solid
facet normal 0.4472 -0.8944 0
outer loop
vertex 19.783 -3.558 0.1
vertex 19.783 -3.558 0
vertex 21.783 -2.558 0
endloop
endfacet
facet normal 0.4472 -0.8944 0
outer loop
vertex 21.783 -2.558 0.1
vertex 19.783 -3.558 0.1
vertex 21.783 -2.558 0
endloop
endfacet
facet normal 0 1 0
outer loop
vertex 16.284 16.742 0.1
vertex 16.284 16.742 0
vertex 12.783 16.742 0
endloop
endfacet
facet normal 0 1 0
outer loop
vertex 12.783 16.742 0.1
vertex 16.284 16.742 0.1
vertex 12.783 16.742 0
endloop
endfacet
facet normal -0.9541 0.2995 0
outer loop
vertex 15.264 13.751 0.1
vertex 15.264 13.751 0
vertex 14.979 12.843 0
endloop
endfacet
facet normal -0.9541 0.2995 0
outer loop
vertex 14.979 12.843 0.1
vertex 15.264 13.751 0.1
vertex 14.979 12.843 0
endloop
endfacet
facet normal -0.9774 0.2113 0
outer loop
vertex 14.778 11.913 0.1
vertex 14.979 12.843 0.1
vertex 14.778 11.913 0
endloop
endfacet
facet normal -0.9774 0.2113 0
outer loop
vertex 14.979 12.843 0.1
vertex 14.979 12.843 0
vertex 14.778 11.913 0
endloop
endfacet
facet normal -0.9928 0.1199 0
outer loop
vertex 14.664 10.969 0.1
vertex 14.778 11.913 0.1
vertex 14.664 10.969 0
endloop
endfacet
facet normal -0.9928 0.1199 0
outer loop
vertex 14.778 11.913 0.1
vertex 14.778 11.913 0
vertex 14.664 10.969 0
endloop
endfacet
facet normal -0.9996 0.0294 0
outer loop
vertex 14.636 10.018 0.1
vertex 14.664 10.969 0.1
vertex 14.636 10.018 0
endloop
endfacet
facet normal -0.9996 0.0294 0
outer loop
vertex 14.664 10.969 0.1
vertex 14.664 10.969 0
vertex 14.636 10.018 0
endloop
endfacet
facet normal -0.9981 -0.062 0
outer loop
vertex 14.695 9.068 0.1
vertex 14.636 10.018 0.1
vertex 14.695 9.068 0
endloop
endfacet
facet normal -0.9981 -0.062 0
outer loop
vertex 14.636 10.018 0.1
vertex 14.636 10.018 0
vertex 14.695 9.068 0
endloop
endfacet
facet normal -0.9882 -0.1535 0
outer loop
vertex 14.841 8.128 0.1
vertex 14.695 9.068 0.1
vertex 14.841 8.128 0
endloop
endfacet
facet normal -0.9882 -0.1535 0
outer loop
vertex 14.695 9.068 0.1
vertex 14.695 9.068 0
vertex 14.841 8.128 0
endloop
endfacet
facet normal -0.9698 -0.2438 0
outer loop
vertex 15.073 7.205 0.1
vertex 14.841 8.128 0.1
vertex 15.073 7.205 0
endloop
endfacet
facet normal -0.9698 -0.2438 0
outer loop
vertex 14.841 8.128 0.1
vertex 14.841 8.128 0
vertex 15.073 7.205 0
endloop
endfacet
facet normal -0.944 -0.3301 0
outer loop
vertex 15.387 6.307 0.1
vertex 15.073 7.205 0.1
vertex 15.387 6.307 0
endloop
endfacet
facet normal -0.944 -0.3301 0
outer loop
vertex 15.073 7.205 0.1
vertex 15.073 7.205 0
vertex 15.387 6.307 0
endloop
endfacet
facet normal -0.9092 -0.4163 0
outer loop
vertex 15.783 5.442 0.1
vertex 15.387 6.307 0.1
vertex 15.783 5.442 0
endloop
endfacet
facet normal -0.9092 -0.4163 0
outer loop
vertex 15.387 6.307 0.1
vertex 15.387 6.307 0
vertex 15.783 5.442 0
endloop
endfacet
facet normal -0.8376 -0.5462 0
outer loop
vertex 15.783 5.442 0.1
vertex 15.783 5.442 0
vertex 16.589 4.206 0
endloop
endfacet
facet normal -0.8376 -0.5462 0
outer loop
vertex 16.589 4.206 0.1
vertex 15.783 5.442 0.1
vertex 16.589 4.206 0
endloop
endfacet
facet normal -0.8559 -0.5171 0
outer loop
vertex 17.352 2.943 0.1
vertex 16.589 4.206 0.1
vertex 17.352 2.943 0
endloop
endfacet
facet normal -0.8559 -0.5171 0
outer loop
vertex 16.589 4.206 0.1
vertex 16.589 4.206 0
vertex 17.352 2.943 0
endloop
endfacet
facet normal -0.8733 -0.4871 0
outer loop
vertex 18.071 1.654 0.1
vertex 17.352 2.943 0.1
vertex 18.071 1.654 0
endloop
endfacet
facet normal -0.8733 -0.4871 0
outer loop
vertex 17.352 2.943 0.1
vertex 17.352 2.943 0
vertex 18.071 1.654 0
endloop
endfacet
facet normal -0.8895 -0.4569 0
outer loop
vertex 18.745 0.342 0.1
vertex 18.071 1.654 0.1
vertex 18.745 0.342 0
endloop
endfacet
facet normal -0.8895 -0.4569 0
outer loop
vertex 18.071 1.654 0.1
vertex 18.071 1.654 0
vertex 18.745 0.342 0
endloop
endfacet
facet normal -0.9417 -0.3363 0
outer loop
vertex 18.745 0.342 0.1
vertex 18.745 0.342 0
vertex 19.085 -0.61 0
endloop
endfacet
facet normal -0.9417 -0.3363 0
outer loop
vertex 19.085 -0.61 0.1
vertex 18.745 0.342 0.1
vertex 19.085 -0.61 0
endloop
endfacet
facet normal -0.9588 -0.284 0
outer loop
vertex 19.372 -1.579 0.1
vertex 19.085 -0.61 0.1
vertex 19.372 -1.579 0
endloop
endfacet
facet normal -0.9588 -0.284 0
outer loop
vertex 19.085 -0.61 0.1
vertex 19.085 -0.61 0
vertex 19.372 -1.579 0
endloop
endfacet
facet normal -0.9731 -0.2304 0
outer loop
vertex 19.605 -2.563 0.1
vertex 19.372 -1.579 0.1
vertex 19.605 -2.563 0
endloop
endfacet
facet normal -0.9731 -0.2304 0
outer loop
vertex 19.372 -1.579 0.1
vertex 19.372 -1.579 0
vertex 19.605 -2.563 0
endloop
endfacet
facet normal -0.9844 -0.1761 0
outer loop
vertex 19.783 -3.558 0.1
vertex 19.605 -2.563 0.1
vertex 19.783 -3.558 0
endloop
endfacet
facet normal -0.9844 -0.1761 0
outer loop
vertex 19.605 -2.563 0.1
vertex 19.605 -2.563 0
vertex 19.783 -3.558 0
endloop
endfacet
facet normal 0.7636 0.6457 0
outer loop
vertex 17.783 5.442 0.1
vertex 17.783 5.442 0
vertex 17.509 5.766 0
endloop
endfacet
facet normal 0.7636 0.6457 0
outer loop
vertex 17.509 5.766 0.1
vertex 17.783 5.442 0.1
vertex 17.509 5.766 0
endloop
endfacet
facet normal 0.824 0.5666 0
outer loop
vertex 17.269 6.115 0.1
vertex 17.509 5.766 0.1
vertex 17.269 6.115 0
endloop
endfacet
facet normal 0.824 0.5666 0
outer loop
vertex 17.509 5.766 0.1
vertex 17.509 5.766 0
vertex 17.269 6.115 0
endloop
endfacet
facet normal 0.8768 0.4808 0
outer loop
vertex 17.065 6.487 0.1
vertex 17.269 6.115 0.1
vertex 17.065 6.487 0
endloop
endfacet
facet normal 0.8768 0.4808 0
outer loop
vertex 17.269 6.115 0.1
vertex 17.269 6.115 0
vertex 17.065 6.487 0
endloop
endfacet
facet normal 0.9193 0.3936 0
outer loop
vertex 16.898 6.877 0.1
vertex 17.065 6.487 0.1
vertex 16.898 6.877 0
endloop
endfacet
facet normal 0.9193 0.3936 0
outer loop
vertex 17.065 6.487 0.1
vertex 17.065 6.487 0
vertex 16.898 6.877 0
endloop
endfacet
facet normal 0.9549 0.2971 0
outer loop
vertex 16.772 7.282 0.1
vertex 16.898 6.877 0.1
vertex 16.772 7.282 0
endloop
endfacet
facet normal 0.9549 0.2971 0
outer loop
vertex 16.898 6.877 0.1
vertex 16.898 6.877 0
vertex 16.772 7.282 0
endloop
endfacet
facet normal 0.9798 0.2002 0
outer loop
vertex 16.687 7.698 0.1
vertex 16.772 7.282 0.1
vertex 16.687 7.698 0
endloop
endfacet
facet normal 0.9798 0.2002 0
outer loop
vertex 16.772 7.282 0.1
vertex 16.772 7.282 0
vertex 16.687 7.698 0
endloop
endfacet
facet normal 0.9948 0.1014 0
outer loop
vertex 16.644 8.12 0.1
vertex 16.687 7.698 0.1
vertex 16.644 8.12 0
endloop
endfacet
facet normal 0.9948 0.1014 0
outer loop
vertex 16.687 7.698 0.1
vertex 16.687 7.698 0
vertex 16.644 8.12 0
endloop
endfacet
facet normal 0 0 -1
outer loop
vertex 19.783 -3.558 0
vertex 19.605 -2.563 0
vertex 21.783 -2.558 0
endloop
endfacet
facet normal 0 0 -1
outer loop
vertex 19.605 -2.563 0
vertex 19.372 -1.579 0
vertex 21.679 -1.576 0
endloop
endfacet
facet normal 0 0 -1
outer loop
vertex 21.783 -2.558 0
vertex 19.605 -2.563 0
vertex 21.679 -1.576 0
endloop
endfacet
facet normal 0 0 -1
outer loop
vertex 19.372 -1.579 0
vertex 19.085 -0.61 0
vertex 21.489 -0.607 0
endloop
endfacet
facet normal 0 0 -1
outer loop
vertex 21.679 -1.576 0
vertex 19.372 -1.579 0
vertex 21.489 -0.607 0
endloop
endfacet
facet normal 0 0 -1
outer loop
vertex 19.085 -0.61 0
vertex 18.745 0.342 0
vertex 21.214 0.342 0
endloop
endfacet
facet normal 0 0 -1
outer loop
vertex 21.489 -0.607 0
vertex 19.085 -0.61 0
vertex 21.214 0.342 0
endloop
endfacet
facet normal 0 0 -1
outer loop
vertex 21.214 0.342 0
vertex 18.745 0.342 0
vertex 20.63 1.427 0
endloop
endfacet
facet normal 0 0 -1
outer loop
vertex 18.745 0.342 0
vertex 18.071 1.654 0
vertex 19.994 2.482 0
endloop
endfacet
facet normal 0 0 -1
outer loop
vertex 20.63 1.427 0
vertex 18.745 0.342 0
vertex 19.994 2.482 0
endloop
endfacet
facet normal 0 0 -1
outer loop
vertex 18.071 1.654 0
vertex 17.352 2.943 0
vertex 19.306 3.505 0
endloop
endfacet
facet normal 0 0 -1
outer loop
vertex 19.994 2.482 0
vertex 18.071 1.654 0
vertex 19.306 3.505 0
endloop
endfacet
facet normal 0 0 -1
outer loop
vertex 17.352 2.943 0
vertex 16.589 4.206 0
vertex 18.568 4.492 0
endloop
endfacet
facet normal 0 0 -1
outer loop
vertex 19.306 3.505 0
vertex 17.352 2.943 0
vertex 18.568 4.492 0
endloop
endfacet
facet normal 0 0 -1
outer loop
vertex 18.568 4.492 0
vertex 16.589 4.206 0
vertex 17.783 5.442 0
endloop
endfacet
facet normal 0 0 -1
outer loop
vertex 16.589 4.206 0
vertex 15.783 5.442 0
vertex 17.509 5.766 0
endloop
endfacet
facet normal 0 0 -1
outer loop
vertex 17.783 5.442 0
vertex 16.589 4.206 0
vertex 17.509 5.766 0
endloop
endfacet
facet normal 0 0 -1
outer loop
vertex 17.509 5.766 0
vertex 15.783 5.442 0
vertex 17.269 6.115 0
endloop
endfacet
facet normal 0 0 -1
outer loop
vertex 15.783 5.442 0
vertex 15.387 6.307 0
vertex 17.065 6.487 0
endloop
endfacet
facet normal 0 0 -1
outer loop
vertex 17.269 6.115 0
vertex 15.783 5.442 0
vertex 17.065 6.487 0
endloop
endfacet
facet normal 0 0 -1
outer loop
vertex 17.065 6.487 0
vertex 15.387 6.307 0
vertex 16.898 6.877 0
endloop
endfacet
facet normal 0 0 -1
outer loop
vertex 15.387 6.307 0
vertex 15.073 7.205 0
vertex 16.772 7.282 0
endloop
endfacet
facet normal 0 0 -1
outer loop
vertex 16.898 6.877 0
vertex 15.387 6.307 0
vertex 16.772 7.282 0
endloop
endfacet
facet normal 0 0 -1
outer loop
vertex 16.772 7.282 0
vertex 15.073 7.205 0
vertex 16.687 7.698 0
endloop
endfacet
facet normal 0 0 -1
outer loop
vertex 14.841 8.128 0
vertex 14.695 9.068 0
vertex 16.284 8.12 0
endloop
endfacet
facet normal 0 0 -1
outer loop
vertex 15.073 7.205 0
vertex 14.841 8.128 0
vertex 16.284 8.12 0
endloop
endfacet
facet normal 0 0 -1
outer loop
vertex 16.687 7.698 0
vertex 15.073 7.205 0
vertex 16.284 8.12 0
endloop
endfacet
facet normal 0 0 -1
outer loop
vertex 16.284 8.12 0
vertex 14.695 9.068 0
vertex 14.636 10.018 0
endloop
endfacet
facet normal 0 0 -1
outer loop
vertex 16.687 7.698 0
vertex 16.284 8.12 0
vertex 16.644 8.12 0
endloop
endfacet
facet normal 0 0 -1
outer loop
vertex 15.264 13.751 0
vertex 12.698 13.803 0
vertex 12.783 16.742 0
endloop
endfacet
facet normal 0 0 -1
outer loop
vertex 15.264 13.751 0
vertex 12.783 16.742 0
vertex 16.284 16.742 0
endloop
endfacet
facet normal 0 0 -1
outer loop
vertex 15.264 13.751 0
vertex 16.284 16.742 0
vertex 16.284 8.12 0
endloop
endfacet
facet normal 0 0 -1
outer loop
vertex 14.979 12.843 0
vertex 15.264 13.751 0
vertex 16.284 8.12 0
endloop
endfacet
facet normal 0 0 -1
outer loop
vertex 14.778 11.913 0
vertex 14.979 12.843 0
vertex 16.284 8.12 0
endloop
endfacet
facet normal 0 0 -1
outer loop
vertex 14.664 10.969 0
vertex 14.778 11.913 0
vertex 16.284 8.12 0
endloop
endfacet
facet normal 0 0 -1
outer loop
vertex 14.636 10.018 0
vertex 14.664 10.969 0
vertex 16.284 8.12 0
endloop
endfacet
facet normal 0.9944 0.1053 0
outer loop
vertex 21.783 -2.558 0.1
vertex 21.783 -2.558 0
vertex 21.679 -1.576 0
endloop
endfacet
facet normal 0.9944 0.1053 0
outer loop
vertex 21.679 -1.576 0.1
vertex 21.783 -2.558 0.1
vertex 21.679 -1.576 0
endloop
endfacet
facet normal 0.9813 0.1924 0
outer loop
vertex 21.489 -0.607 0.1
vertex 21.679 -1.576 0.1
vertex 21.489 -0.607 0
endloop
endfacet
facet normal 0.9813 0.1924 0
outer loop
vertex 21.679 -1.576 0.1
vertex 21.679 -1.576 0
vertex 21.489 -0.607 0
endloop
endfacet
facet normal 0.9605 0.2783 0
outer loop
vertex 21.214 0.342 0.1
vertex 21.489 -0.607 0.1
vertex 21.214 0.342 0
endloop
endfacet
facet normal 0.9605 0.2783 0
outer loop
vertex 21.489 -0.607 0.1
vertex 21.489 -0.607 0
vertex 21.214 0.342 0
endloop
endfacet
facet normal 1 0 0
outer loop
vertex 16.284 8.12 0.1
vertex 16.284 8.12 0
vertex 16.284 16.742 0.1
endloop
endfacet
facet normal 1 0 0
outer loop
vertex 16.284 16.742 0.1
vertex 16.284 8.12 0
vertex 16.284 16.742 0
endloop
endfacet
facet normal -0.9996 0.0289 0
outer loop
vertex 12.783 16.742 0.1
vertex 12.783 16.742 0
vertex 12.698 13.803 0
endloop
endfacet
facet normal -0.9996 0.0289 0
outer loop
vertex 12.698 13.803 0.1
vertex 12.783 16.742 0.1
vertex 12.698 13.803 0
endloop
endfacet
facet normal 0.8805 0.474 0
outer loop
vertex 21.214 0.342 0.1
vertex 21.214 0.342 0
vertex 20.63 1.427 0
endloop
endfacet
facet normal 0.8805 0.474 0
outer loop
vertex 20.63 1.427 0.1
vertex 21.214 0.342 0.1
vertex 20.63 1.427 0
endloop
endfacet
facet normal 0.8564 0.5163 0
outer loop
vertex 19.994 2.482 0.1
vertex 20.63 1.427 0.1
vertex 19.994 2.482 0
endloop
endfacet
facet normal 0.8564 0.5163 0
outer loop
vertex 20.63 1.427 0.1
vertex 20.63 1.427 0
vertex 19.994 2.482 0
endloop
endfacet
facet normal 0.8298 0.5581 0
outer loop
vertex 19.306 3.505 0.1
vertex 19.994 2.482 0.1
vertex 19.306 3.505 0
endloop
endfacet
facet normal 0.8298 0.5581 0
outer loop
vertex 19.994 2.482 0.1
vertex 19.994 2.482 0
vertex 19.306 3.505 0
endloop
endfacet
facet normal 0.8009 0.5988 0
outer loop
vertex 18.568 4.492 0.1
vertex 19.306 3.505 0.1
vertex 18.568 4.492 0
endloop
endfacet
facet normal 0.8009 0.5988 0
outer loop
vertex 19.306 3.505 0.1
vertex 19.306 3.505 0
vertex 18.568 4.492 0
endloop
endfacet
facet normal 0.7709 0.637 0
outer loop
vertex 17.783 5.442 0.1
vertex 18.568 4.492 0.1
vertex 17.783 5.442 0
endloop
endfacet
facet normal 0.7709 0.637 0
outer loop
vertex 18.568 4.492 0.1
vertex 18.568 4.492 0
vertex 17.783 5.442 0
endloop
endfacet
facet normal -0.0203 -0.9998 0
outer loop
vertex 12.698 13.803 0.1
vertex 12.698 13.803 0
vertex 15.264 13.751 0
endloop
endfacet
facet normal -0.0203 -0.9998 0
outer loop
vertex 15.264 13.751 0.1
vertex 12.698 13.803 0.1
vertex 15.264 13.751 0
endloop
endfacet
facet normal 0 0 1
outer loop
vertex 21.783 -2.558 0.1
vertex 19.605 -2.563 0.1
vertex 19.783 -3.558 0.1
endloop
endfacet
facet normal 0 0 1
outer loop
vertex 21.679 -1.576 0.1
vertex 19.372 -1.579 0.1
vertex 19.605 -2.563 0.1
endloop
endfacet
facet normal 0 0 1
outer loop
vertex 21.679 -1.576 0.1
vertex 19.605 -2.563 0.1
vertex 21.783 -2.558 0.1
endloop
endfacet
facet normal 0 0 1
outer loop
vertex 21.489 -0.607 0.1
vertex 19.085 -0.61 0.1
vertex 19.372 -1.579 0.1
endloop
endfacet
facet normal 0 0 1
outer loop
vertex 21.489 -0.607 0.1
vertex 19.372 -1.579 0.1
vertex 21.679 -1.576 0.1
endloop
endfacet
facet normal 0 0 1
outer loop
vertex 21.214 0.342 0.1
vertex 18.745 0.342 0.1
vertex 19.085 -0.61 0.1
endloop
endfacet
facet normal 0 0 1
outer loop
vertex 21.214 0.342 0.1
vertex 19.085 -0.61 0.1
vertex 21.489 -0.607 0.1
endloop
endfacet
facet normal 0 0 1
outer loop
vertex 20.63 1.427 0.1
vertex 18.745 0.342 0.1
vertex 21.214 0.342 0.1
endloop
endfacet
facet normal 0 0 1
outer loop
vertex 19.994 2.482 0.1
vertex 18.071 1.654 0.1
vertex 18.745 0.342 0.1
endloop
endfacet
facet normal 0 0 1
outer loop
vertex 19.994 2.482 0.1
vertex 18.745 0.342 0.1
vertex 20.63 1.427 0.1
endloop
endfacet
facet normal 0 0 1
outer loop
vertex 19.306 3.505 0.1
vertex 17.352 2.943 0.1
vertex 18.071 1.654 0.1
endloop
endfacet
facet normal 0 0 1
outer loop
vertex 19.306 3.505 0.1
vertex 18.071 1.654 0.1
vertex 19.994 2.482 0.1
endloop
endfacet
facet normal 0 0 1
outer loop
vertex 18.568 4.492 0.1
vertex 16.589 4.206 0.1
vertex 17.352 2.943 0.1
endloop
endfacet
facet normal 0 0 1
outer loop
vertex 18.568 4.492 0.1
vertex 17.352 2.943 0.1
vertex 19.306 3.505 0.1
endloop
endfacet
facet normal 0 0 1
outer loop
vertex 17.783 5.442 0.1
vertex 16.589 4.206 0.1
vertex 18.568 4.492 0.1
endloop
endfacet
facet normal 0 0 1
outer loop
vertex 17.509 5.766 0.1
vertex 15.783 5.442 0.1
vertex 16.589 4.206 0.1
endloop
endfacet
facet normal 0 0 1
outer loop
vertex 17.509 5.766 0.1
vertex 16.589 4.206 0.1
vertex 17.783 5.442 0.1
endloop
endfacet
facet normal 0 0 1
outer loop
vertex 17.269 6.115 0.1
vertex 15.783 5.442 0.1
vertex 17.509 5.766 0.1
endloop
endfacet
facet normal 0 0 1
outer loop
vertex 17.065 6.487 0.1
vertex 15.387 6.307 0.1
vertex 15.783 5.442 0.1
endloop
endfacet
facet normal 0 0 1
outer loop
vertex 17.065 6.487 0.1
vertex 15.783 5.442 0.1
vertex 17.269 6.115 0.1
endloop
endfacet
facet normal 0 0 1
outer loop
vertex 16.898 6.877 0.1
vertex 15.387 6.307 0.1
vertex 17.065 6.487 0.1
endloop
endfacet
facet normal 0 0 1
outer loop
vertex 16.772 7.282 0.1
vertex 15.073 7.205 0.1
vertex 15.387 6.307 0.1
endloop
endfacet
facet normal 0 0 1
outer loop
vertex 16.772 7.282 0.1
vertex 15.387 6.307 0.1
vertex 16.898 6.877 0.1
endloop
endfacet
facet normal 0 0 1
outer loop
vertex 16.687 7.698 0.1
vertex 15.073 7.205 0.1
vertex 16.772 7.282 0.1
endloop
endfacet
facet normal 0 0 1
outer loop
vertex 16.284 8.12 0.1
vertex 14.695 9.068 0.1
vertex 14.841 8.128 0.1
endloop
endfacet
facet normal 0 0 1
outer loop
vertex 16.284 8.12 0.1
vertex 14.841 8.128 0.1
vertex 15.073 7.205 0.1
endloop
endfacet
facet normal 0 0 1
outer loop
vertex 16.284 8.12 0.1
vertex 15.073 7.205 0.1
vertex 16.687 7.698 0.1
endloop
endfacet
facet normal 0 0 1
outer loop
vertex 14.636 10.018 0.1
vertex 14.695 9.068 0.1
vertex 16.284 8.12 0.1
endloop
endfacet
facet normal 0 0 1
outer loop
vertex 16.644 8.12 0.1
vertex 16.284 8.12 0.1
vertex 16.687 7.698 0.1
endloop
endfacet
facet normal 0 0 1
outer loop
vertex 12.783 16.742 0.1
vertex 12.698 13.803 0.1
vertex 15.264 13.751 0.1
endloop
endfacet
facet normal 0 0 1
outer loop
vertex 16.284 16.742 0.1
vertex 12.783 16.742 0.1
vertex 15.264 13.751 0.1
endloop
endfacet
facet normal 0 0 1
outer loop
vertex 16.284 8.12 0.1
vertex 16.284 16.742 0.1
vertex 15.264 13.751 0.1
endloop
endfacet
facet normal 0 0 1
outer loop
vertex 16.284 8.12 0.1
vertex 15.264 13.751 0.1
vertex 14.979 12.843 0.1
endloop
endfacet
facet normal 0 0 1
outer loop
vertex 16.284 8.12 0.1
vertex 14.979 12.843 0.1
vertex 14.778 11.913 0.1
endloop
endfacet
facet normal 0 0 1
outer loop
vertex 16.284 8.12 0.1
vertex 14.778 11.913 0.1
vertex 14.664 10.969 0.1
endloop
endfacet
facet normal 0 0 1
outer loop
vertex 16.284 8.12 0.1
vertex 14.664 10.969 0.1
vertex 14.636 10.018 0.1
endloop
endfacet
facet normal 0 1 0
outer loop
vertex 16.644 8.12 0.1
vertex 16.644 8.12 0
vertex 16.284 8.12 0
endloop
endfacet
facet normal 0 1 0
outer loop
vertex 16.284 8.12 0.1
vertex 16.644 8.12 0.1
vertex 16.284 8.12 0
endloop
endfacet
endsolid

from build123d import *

# Parameters (mm, degrees)
SALIENTE_EXTRUIR1_DEPTH = 0.1


with BuildPart() as part:
    # Model → Saliente-Extruir1 (new body)
    with BuildSketch(Plane.XY):
        with BuildLine():
            Line((12.698297287, 13.802618595), (15.263616387, 13.750921574))
            ThreePointArc((15.263616387, 13.750921574), (14.654945019, 9.542094065), (15.782845256, 5.441782991))
            ThreePointArc((15.782845256, 5.441782991), (17.35183527, 2.94274106), (18.745376573, 0.341782991))
            ThreePointArc((18.745376573, 0.341782991), (19.372340085, -1.579426143), (19.782845256, -3.558217009))
            Line((19.782845256, -3.558217009), (21.782845256, -2.558217009))
            ThreePointArc((21.782845256, -2.558217009), (21.595097776, -1.089252971), (21.213993411, 0.341782991))
            ThreePointArc((21.213993411, 0.341782991), (19.656131166, 2.997887435), (17.782845256, 5.441782991))
            ThreePointArc((17.782845256, 5.441782991), (16.97662621, 6.680138732), (16.643698969, 8.119817009))
            Line((16.643698969, 8.119817009), (16.284102713, 8.119817009))
            Line((16.284102713, 8.119817009), (16.284102713, 16.741782991))
            Line((16.284102713, 16.741782991), (12.782845256, 16.741782991))
            Line((12.782845256, 16.741782991), (12.698297287, 13.802618595))
        make_face()
    extrude(amount=SALIENTE_EXTRUIR1_DEPTH)


solid = part.part
